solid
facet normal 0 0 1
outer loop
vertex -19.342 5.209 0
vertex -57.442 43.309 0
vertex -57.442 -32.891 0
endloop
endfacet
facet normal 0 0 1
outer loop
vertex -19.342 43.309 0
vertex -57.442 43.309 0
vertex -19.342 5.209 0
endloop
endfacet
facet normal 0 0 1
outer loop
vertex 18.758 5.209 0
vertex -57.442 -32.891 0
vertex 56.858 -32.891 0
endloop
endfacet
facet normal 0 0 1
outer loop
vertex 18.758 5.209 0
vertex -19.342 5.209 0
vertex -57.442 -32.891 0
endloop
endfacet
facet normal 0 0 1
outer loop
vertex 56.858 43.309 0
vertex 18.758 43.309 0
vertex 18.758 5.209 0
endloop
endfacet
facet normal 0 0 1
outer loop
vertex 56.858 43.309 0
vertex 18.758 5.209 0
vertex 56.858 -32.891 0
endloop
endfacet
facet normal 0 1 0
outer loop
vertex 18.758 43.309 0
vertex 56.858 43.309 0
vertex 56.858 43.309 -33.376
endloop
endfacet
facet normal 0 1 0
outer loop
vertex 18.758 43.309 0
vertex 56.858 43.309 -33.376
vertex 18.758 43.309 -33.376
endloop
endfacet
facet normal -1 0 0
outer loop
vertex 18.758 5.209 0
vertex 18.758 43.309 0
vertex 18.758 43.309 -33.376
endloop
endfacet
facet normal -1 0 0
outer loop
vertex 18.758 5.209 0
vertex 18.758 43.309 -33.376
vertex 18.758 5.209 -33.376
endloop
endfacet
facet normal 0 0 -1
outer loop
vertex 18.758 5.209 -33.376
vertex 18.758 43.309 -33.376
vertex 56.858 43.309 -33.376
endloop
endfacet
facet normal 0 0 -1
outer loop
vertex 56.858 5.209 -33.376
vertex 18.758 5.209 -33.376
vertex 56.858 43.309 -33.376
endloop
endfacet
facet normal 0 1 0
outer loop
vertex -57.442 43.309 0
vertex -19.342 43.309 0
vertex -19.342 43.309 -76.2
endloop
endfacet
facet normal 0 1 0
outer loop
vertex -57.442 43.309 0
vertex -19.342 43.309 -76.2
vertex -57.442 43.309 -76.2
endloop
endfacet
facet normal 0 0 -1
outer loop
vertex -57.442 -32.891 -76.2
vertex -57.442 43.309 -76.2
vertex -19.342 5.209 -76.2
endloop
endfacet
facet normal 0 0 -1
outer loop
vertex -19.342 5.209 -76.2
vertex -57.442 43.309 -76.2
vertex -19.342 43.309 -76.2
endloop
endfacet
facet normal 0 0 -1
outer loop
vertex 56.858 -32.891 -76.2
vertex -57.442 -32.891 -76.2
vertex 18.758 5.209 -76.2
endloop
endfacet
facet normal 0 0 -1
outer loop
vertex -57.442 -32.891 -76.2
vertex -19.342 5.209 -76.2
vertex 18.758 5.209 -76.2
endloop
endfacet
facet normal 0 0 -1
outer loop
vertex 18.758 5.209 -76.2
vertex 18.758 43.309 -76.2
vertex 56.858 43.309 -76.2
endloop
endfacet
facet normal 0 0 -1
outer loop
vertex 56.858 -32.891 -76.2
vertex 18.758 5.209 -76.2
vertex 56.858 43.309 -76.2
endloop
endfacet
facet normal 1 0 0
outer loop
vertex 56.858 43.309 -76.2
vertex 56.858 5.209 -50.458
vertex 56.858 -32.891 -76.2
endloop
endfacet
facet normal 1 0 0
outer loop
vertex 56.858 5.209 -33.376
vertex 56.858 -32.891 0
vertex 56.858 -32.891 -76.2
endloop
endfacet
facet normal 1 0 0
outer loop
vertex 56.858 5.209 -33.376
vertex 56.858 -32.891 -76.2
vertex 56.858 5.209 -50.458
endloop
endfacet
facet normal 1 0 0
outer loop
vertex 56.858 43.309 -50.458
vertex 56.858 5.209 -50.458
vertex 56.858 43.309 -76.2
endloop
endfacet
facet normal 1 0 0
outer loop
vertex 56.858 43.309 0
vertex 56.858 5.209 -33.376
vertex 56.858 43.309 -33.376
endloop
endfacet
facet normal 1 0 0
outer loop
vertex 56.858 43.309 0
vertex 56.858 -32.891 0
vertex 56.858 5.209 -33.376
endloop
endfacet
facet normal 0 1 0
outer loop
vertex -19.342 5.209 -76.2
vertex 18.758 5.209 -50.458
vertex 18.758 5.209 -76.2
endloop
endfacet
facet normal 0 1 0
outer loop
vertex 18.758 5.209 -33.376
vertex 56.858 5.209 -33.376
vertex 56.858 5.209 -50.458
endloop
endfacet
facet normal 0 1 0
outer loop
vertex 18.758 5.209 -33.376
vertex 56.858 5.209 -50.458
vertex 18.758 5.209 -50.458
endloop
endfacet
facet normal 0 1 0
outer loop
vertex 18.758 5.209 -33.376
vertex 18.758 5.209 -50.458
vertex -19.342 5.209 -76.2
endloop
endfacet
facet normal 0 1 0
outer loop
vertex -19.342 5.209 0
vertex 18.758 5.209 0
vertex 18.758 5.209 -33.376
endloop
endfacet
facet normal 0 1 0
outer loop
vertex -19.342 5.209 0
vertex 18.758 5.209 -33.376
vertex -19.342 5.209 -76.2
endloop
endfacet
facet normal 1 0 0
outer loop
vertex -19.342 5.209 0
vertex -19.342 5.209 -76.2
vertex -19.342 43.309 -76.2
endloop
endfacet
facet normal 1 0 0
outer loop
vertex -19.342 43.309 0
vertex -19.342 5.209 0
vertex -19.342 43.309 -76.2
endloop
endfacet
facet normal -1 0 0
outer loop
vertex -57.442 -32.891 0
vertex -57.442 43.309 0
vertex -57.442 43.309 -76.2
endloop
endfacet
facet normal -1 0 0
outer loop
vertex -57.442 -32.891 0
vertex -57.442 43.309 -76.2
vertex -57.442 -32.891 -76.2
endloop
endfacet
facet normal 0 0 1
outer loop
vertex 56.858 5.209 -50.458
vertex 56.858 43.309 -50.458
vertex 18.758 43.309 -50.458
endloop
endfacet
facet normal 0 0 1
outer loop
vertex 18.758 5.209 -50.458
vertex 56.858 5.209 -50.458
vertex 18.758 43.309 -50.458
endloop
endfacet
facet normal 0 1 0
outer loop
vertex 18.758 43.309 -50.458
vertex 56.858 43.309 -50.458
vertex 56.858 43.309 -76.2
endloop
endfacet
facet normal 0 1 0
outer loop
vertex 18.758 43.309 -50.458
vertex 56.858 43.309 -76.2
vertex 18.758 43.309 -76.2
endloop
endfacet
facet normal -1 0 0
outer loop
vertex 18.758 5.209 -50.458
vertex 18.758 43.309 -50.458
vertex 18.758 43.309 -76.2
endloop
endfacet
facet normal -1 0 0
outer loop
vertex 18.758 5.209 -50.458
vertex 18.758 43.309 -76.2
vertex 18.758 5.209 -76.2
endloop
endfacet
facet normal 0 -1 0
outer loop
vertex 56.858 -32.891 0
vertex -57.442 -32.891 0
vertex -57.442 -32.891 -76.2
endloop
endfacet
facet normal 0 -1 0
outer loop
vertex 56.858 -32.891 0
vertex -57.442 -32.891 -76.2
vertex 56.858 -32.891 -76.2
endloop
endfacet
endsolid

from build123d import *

# Parameters (mm, degrees)
F1_DEPTH = 76.2
F3_DEPTH = 38.1


with BuildPart() as f1:
    # F0 (on Top) → F1 (new body)
    with BuildSketch(Plane.XY):
        Polygon((-19.342009, 43.308758), (-57.442009, 43.308758), (-57.442009, -32.891242), (56.857991, -32.891242), (56.857991, 43.308758), (18.757991, 43.308758), (18.757991, 5.208758), (-19.342009, 5.208758), align=None)
    extrude(amount=-F1_DEPTH)

    # F2 (on face) → F3 (cut)
    with BuildSketch(Plane(origin=(0, 43.308758, 0), x_dir=(-1, 0, 0), z_dir=(0, 1, 0))):
        Polygon((-18.757991, -50.457798), (-18.757991, -33.375844), (-56.857991, -33.375844), (-56.857991, -34.49871), (-56.857991, -50.457798), align=None)
    extrude(amount=-F3_DEPTH, mode=Mode.SUBTRACT)


solid = f1.part
